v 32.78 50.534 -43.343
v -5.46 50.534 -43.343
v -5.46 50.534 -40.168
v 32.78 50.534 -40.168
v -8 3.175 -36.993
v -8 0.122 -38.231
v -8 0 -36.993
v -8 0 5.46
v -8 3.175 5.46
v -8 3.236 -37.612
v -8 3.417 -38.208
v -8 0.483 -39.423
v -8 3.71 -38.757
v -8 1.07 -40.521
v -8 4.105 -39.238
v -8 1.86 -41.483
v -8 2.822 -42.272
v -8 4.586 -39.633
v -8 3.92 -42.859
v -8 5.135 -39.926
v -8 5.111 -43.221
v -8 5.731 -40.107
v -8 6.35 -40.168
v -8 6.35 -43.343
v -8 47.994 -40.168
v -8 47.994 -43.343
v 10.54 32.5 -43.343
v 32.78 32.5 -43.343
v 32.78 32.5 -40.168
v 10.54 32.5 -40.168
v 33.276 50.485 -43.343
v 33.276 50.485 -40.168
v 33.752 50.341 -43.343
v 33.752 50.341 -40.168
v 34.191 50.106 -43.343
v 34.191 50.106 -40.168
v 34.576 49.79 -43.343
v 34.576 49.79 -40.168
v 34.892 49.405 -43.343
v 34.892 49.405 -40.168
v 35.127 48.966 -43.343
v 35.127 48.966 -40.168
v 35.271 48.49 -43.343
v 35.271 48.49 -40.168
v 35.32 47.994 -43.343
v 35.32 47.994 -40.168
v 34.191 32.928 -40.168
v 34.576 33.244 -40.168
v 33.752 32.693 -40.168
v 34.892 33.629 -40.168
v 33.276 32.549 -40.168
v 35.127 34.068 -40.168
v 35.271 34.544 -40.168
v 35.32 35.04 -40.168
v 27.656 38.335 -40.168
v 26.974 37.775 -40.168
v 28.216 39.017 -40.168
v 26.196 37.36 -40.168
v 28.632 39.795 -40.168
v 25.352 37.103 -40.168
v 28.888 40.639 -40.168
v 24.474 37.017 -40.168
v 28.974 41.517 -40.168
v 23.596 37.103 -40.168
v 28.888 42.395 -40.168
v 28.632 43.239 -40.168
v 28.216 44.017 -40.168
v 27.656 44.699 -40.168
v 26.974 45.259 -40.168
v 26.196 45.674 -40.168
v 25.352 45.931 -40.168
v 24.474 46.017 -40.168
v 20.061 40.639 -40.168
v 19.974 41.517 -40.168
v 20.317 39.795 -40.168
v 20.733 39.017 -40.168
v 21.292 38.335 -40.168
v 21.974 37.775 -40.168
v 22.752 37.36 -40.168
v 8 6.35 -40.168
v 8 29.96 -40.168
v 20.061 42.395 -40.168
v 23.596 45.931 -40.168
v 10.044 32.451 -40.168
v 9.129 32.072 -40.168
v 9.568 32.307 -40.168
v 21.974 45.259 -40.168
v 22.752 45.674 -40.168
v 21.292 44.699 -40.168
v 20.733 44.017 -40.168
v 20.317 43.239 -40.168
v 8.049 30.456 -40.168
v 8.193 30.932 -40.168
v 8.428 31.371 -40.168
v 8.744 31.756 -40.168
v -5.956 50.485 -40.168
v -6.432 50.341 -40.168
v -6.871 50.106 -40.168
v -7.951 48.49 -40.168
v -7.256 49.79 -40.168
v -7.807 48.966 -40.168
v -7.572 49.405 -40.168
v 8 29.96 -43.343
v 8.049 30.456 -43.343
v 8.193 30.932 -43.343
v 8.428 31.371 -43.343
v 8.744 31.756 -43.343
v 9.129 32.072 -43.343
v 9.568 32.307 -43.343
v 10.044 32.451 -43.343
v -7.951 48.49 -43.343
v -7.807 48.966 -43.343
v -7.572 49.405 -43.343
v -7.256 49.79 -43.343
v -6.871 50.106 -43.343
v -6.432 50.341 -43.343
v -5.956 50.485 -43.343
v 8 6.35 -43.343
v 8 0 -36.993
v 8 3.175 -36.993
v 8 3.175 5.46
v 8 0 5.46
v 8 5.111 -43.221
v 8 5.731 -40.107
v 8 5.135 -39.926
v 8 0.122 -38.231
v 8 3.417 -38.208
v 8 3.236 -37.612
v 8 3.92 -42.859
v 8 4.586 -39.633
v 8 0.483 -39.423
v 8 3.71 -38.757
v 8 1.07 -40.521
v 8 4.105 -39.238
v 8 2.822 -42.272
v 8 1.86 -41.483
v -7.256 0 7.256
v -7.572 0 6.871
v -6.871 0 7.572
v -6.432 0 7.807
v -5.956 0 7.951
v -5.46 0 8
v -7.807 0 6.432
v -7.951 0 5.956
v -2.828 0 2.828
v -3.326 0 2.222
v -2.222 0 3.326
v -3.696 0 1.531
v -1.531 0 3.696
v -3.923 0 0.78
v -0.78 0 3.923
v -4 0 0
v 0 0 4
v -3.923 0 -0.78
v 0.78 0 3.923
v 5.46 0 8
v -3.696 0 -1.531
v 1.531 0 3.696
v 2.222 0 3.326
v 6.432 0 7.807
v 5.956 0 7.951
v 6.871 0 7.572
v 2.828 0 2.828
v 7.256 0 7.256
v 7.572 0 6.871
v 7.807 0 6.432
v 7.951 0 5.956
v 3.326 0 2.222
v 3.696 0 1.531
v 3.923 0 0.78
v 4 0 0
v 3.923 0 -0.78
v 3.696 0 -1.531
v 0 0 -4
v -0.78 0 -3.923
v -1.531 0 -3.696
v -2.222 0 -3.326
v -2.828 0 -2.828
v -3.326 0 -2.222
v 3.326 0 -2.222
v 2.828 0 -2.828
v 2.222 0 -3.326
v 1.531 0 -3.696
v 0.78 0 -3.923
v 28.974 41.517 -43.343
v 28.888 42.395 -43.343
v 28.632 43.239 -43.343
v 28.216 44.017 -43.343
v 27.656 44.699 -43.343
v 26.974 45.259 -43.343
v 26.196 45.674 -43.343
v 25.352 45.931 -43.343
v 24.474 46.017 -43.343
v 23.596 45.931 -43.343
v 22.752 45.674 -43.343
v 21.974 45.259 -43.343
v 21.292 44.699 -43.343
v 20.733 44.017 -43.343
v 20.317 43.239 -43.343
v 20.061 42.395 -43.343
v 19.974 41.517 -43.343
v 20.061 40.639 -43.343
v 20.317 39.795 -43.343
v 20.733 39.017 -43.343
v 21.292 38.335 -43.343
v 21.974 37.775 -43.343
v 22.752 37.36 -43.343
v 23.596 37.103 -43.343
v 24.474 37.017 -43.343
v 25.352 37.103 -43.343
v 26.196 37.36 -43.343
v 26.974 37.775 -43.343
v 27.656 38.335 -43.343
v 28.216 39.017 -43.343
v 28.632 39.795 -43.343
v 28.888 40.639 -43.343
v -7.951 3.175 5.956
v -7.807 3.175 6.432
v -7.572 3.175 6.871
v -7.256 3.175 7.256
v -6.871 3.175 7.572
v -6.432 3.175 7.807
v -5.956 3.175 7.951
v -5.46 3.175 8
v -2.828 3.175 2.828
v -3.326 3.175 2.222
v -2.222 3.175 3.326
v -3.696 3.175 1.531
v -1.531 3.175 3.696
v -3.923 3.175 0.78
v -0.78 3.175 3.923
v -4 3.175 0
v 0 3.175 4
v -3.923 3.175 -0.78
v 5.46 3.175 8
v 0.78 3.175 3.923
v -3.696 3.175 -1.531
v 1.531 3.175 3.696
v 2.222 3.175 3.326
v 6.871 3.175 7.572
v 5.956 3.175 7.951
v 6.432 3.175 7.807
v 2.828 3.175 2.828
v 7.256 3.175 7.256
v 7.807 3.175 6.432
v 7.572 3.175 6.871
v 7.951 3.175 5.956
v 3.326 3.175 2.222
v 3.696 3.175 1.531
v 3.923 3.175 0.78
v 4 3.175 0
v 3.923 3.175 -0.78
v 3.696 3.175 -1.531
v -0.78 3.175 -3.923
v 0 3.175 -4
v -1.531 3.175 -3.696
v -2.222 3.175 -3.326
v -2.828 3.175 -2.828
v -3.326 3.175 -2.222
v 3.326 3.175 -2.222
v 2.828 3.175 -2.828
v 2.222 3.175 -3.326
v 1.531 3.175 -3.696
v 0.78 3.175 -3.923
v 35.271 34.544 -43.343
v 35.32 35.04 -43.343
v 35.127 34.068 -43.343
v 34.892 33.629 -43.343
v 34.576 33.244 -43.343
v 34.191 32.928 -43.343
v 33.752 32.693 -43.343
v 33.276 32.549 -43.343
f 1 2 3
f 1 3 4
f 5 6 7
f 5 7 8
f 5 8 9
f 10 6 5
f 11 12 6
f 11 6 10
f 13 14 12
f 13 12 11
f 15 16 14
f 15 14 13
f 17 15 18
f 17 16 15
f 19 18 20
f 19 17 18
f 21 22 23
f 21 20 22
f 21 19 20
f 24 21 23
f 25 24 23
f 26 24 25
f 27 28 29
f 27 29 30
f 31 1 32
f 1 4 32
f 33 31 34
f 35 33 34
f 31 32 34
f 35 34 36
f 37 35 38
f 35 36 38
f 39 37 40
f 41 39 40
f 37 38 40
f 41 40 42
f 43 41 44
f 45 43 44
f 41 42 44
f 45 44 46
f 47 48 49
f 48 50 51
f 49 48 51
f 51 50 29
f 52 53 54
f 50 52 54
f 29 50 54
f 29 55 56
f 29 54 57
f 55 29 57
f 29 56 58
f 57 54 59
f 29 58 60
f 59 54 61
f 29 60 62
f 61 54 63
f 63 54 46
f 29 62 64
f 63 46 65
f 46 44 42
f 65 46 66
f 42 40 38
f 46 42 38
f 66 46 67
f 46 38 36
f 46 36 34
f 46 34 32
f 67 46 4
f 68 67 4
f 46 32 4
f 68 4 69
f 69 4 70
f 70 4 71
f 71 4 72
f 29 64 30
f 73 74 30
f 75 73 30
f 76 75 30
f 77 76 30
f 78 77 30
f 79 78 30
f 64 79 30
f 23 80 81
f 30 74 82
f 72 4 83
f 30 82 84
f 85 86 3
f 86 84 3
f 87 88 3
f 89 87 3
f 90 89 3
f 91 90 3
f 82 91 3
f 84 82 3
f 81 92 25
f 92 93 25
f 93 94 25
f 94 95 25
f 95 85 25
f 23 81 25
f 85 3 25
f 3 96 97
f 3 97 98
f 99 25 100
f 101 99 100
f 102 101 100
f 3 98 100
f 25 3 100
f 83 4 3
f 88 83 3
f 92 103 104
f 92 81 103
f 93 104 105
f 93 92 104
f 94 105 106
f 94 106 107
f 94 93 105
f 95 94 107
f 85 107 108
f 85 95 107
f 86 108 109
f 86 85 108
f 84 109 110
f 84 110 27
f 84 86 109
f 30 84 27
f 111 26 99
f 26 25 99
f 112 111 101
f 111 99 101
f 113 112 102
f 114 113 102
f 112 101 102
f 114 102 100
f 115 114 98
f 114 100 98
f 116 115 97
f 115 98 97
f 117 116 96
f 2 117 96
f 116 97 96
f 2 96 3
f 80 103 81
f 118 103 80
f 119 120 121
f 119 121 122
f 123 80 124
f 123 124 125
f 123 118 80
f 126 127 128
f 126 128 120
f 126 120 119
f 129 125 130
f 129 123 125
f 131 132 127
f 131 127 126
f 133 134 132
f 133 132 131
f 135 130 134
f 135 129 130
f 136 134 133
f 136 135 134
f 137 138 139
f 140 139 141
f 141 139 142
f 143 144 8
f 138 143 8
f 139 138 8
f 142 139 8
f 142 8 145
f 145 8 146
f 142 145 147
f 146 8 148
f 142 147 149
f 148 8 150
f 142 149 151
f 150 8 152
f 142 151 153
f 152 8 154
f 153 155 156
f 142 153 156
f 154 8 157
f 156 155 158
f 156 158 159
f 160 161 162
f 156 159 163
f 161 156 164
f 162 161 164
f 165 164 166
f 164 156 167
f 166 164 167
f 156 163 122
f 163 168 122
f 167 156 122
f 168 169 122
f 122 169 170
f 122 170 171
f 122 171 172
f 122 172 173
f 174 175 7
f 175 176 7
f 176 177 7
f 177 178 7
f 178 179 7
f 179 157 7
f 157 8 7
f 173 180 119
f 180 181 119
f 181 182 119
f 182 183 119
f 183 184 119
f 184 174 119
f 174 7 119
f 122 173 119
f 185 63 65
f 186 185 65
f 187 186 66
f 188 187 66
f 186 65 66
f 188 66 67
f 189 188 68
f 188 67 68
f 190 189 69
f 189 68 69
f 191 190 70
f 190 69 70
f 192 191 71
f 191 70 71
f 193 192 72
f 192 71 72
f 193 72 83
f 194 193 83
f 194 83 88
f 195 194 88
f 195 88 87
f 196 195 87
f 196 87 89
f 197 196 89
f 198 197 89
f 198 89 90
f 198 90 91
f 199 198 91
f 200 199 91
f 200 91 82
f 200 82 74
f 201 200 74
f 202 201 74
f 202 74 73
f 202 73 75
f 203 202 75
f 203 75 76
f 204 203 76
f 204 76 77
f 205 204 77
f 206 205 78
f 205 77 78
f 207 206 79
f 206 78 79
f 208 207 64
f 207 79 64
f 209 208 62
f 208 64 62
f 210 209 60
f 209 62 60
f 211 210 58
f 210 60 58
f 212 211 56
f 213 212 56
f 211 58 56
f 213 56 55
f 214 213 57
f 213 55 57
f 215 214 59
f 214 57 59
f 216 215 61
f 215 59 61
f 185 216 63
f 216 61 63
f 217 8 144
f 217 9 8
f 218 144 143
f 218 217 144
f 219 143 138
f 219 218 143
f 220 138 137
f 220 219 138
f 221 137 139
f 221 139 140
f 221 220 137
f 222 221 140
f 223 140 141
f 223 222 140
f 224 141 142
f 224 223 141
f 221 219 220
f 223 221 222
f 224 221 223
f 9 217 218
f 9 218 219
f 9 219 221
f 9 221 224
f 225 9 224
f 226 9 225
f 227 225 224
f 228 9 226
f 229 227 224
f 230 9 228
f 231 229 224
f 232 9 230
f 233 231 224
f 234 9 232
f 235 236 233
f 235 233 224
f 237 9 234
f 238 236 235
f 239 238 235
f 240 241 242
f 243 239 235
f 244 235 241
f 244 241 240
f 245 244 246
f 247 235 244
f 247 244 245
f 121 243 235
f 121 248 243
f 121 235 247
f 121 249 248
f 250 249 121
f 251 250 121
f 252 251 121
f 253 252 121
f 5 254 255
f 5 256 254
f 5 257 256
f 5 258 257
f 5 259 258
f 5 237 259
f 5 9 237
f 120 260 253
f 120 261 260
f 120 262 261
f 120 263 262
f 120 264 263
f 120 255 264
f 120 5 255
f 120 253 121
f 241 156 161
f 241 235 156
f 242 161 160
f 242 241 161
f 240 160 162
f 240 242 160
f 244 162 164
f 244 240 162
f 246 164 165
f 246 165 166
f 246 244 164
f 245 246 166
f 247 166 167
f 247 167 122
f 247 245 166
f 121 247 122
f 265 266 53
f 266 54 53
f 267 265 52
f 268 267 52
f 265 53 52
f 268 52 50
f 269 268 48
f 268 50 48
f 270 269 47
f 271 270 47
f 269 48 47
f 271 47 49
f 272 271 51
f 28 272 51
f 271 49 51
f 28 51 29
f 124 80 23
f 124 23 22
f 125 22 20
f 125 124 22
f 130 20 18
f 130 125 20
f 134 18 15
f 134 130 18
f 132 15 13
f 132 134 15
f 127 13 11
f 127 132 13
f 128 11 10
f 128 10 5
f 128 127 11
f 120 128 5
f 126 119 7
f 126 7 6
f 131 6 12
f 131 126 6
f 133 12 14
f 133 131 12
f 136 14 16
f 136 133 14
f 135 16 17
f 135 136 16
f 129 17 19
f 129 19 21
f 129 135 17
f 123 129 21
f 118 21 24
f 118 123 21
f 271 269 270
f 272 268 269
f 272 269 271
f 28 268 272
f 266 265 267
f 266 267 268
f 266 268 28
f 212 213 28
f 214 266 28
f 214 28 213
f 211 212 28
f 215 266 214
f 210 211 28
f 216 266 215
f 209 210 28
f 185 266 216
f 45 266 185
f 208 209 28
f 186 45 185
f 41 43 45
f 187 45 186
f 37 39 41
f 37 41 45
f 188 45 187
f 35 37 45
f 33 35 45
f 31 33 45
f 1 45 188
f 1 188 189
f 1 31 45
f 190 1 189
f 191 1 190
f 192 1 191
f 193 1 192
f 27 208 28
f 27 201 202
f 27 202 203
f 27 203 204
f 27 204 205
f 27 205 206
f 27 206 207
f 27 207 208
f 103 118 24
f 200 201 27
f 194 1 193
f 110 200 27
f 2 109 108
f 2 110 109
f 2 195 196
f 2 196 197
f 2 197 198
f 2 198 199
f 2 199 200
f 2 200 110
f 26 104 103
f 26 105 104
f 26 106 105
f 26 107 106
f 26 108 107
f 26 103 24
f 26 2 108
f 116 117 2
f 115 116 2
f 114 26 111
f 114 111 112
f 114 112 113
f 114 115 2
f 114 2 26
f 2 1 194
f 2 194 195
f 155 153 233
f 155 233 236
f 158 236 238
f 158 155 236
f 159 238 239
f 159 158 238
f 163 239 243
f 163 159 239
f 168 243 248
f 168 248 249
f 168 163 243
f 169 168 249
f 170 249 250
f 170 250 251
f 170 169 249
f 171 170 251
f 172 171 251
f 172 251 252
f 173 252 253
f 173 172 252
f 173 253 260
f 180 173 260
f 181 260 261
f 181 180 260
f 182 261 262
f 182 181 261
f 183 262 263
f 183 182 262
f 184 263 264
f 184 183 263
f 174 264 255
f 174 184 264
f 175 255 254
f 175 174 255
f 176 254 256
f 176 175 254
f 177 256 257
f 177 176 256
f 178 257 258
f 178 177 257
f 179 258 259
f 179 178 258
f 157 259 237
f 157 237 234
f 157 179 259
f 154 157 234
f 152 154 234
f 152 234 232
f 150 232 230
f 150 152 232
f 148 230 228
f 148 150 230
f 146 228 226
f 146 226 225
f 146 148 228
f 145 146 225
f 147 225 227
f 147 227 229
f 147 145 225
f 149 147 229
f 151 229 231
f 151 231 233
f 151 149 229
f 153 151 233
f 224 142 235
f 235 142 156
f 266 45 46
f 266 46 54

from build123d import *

# Parameters (mm, degrees)
SKETCH1_W                    = 16
SKETCH1_H                    = 48.167640012
SKETCH1_R                    = 4
BOSS_EXTRUDE1_DEPTH          = 3.175
EDGE_FLANGE1_STRIP_W         = 19.05
EDGE_FLANGE1_STRIP_H         = 3.175
EDGE_FLANGE1_STRIP_CUT_DEPTH = 16
EDGE_FLANGE1_DEPTH           = 16
EDGE_FLANGE1_START           = 3.175
EDGE_FLANGE1_FLAT_DEPTH      = 3.175
SKETCH11_R                   = 3.7210804
CUT_EXTRUDE1_DEPTH           = 81.232501141
M8_CLEARANCE_HOLE1_D         = 9
FILLET1_R                    = 2.54


# Sheet-metal steps are written as plain solids
with BuildPart() as part:
    # Sketch1 → Boss-Extrude1 (new body)
    with BuildSketch(Plane(origin=(0, 0, 0), x_dir=(1, 0, 0), z_dir=(0, 1, 0))):
        with Locations((0, 16.083820006)):
            Rectangle(SKETCH1_W, SKETCH1_H)
        with Locations(Location((0, 0, 0), (0, 0, 270))):
            Circle(SKETCH1_R, mode=Mode.SUBTRACT)
    extrude(amount=BOSS_EXTRUDE1_DEPTH)

    # Edge-Flange1 strip (across the edge) → Edge-Flange1 strip cut (cut)
    with BuildSketch(Plane(origin=(8, 3.175, -40.167640012), x_dir=(0, 0, 1), z_dir=(-1, 0, 0))):
        with Locations((-6.35, -1.5875)):
            Rectangle(EDGE_FLANGE1_STRIP_W, EDGE_FLANGE1_STRIP_H)
    extrude(amount=EDGE_FLANGE1_STRIP_CUT_DEPTH, mode=Mode.SUBTRACT)

    # Edge-Flange1 bend section (across the edge) → Edge-Flange1 (add)
    with BuildSketch(Plane(origin=(8, 3.175, -40.167640012), x_dir=(0, 0, 1), z_dir=(-1, 0, 0))):
        with BuildLine():
            Line((-3.175, 3.175), (0, 3.175))
            ThreePointArc((0, 3.175), (0.92993597, 0.92993597), (3.175, 0))
            Line((3.175, 0), (3.175, -3.175))
            ThreePointArc((3.175, -3.175), (-1.315128061, -1.315128061), (-3.175, 3.175))
        make_face()
    extrude(amount=EDGE_FLANGE1_DEPTH)

    # Edge-Flange1 profile (on flange) → Edge-Flange1 flat (add)
    with BuildSketch(Plane(origin=(0, 3.175, -40.167640012), x_dir=(-1, 0, 0), z_dir=(0, 0, -1)).offset(EDGE_FLANGE1_START)):
        Polygon((8, 3.175), (8, 47.359), (-8, 47.359), (-27.7, 47.359), (-35.32, 47.359), (-35.32, 29.325), (-27.7, 29.325), (-8, 29.325), (-8, 3.175), align=None)
    extrude(amount=-EDGE_FLANGE1_FLAT_DEPTH)

    # Sketch11 → Cut-Extrude1 (cut, through all)
    with BuildSketch(Plane(origin=(0, 0, -43.342640012), x_dir=(-1, 0, 0), z_dir=(0, 0, -1))):
        with Locations(Location((-24.4742, 41.517, 0), (0, 0, 90))):
            Circle(SKETCH11_R)
    extrude(amount=-CUT_EXTRUDE1_DEPTH, mode=Mode.SUBTRACT)

    # M8 Clearance Hole1 (through all)
    with Locations(Plane(origin=(0, 0, -43.342640012), x_dir=(-1, 0, 0), z_dir=(0, 0, -1))):
        with Locations((-24.4742, 41.517)):
            Hole(M8_CLEARANCE_HOLE1_D / 2)

    # Fillet1
    fillet1_edges = [part.edges().sort_by_distance(p)[0] for p in [
        (8, 32.5, -41.755140012),
        (-8, 50.534, -41.755140012),
        (35.32, 50.534, -41.755140012),
        (35.32, 32.5, -41.755140012),
        (8, 1.5875, 8),
        (-8, 1.5875, 8),
    ]]
    fillet(fillet1_edges, radius=FILLET1_R)


solid = part.part
